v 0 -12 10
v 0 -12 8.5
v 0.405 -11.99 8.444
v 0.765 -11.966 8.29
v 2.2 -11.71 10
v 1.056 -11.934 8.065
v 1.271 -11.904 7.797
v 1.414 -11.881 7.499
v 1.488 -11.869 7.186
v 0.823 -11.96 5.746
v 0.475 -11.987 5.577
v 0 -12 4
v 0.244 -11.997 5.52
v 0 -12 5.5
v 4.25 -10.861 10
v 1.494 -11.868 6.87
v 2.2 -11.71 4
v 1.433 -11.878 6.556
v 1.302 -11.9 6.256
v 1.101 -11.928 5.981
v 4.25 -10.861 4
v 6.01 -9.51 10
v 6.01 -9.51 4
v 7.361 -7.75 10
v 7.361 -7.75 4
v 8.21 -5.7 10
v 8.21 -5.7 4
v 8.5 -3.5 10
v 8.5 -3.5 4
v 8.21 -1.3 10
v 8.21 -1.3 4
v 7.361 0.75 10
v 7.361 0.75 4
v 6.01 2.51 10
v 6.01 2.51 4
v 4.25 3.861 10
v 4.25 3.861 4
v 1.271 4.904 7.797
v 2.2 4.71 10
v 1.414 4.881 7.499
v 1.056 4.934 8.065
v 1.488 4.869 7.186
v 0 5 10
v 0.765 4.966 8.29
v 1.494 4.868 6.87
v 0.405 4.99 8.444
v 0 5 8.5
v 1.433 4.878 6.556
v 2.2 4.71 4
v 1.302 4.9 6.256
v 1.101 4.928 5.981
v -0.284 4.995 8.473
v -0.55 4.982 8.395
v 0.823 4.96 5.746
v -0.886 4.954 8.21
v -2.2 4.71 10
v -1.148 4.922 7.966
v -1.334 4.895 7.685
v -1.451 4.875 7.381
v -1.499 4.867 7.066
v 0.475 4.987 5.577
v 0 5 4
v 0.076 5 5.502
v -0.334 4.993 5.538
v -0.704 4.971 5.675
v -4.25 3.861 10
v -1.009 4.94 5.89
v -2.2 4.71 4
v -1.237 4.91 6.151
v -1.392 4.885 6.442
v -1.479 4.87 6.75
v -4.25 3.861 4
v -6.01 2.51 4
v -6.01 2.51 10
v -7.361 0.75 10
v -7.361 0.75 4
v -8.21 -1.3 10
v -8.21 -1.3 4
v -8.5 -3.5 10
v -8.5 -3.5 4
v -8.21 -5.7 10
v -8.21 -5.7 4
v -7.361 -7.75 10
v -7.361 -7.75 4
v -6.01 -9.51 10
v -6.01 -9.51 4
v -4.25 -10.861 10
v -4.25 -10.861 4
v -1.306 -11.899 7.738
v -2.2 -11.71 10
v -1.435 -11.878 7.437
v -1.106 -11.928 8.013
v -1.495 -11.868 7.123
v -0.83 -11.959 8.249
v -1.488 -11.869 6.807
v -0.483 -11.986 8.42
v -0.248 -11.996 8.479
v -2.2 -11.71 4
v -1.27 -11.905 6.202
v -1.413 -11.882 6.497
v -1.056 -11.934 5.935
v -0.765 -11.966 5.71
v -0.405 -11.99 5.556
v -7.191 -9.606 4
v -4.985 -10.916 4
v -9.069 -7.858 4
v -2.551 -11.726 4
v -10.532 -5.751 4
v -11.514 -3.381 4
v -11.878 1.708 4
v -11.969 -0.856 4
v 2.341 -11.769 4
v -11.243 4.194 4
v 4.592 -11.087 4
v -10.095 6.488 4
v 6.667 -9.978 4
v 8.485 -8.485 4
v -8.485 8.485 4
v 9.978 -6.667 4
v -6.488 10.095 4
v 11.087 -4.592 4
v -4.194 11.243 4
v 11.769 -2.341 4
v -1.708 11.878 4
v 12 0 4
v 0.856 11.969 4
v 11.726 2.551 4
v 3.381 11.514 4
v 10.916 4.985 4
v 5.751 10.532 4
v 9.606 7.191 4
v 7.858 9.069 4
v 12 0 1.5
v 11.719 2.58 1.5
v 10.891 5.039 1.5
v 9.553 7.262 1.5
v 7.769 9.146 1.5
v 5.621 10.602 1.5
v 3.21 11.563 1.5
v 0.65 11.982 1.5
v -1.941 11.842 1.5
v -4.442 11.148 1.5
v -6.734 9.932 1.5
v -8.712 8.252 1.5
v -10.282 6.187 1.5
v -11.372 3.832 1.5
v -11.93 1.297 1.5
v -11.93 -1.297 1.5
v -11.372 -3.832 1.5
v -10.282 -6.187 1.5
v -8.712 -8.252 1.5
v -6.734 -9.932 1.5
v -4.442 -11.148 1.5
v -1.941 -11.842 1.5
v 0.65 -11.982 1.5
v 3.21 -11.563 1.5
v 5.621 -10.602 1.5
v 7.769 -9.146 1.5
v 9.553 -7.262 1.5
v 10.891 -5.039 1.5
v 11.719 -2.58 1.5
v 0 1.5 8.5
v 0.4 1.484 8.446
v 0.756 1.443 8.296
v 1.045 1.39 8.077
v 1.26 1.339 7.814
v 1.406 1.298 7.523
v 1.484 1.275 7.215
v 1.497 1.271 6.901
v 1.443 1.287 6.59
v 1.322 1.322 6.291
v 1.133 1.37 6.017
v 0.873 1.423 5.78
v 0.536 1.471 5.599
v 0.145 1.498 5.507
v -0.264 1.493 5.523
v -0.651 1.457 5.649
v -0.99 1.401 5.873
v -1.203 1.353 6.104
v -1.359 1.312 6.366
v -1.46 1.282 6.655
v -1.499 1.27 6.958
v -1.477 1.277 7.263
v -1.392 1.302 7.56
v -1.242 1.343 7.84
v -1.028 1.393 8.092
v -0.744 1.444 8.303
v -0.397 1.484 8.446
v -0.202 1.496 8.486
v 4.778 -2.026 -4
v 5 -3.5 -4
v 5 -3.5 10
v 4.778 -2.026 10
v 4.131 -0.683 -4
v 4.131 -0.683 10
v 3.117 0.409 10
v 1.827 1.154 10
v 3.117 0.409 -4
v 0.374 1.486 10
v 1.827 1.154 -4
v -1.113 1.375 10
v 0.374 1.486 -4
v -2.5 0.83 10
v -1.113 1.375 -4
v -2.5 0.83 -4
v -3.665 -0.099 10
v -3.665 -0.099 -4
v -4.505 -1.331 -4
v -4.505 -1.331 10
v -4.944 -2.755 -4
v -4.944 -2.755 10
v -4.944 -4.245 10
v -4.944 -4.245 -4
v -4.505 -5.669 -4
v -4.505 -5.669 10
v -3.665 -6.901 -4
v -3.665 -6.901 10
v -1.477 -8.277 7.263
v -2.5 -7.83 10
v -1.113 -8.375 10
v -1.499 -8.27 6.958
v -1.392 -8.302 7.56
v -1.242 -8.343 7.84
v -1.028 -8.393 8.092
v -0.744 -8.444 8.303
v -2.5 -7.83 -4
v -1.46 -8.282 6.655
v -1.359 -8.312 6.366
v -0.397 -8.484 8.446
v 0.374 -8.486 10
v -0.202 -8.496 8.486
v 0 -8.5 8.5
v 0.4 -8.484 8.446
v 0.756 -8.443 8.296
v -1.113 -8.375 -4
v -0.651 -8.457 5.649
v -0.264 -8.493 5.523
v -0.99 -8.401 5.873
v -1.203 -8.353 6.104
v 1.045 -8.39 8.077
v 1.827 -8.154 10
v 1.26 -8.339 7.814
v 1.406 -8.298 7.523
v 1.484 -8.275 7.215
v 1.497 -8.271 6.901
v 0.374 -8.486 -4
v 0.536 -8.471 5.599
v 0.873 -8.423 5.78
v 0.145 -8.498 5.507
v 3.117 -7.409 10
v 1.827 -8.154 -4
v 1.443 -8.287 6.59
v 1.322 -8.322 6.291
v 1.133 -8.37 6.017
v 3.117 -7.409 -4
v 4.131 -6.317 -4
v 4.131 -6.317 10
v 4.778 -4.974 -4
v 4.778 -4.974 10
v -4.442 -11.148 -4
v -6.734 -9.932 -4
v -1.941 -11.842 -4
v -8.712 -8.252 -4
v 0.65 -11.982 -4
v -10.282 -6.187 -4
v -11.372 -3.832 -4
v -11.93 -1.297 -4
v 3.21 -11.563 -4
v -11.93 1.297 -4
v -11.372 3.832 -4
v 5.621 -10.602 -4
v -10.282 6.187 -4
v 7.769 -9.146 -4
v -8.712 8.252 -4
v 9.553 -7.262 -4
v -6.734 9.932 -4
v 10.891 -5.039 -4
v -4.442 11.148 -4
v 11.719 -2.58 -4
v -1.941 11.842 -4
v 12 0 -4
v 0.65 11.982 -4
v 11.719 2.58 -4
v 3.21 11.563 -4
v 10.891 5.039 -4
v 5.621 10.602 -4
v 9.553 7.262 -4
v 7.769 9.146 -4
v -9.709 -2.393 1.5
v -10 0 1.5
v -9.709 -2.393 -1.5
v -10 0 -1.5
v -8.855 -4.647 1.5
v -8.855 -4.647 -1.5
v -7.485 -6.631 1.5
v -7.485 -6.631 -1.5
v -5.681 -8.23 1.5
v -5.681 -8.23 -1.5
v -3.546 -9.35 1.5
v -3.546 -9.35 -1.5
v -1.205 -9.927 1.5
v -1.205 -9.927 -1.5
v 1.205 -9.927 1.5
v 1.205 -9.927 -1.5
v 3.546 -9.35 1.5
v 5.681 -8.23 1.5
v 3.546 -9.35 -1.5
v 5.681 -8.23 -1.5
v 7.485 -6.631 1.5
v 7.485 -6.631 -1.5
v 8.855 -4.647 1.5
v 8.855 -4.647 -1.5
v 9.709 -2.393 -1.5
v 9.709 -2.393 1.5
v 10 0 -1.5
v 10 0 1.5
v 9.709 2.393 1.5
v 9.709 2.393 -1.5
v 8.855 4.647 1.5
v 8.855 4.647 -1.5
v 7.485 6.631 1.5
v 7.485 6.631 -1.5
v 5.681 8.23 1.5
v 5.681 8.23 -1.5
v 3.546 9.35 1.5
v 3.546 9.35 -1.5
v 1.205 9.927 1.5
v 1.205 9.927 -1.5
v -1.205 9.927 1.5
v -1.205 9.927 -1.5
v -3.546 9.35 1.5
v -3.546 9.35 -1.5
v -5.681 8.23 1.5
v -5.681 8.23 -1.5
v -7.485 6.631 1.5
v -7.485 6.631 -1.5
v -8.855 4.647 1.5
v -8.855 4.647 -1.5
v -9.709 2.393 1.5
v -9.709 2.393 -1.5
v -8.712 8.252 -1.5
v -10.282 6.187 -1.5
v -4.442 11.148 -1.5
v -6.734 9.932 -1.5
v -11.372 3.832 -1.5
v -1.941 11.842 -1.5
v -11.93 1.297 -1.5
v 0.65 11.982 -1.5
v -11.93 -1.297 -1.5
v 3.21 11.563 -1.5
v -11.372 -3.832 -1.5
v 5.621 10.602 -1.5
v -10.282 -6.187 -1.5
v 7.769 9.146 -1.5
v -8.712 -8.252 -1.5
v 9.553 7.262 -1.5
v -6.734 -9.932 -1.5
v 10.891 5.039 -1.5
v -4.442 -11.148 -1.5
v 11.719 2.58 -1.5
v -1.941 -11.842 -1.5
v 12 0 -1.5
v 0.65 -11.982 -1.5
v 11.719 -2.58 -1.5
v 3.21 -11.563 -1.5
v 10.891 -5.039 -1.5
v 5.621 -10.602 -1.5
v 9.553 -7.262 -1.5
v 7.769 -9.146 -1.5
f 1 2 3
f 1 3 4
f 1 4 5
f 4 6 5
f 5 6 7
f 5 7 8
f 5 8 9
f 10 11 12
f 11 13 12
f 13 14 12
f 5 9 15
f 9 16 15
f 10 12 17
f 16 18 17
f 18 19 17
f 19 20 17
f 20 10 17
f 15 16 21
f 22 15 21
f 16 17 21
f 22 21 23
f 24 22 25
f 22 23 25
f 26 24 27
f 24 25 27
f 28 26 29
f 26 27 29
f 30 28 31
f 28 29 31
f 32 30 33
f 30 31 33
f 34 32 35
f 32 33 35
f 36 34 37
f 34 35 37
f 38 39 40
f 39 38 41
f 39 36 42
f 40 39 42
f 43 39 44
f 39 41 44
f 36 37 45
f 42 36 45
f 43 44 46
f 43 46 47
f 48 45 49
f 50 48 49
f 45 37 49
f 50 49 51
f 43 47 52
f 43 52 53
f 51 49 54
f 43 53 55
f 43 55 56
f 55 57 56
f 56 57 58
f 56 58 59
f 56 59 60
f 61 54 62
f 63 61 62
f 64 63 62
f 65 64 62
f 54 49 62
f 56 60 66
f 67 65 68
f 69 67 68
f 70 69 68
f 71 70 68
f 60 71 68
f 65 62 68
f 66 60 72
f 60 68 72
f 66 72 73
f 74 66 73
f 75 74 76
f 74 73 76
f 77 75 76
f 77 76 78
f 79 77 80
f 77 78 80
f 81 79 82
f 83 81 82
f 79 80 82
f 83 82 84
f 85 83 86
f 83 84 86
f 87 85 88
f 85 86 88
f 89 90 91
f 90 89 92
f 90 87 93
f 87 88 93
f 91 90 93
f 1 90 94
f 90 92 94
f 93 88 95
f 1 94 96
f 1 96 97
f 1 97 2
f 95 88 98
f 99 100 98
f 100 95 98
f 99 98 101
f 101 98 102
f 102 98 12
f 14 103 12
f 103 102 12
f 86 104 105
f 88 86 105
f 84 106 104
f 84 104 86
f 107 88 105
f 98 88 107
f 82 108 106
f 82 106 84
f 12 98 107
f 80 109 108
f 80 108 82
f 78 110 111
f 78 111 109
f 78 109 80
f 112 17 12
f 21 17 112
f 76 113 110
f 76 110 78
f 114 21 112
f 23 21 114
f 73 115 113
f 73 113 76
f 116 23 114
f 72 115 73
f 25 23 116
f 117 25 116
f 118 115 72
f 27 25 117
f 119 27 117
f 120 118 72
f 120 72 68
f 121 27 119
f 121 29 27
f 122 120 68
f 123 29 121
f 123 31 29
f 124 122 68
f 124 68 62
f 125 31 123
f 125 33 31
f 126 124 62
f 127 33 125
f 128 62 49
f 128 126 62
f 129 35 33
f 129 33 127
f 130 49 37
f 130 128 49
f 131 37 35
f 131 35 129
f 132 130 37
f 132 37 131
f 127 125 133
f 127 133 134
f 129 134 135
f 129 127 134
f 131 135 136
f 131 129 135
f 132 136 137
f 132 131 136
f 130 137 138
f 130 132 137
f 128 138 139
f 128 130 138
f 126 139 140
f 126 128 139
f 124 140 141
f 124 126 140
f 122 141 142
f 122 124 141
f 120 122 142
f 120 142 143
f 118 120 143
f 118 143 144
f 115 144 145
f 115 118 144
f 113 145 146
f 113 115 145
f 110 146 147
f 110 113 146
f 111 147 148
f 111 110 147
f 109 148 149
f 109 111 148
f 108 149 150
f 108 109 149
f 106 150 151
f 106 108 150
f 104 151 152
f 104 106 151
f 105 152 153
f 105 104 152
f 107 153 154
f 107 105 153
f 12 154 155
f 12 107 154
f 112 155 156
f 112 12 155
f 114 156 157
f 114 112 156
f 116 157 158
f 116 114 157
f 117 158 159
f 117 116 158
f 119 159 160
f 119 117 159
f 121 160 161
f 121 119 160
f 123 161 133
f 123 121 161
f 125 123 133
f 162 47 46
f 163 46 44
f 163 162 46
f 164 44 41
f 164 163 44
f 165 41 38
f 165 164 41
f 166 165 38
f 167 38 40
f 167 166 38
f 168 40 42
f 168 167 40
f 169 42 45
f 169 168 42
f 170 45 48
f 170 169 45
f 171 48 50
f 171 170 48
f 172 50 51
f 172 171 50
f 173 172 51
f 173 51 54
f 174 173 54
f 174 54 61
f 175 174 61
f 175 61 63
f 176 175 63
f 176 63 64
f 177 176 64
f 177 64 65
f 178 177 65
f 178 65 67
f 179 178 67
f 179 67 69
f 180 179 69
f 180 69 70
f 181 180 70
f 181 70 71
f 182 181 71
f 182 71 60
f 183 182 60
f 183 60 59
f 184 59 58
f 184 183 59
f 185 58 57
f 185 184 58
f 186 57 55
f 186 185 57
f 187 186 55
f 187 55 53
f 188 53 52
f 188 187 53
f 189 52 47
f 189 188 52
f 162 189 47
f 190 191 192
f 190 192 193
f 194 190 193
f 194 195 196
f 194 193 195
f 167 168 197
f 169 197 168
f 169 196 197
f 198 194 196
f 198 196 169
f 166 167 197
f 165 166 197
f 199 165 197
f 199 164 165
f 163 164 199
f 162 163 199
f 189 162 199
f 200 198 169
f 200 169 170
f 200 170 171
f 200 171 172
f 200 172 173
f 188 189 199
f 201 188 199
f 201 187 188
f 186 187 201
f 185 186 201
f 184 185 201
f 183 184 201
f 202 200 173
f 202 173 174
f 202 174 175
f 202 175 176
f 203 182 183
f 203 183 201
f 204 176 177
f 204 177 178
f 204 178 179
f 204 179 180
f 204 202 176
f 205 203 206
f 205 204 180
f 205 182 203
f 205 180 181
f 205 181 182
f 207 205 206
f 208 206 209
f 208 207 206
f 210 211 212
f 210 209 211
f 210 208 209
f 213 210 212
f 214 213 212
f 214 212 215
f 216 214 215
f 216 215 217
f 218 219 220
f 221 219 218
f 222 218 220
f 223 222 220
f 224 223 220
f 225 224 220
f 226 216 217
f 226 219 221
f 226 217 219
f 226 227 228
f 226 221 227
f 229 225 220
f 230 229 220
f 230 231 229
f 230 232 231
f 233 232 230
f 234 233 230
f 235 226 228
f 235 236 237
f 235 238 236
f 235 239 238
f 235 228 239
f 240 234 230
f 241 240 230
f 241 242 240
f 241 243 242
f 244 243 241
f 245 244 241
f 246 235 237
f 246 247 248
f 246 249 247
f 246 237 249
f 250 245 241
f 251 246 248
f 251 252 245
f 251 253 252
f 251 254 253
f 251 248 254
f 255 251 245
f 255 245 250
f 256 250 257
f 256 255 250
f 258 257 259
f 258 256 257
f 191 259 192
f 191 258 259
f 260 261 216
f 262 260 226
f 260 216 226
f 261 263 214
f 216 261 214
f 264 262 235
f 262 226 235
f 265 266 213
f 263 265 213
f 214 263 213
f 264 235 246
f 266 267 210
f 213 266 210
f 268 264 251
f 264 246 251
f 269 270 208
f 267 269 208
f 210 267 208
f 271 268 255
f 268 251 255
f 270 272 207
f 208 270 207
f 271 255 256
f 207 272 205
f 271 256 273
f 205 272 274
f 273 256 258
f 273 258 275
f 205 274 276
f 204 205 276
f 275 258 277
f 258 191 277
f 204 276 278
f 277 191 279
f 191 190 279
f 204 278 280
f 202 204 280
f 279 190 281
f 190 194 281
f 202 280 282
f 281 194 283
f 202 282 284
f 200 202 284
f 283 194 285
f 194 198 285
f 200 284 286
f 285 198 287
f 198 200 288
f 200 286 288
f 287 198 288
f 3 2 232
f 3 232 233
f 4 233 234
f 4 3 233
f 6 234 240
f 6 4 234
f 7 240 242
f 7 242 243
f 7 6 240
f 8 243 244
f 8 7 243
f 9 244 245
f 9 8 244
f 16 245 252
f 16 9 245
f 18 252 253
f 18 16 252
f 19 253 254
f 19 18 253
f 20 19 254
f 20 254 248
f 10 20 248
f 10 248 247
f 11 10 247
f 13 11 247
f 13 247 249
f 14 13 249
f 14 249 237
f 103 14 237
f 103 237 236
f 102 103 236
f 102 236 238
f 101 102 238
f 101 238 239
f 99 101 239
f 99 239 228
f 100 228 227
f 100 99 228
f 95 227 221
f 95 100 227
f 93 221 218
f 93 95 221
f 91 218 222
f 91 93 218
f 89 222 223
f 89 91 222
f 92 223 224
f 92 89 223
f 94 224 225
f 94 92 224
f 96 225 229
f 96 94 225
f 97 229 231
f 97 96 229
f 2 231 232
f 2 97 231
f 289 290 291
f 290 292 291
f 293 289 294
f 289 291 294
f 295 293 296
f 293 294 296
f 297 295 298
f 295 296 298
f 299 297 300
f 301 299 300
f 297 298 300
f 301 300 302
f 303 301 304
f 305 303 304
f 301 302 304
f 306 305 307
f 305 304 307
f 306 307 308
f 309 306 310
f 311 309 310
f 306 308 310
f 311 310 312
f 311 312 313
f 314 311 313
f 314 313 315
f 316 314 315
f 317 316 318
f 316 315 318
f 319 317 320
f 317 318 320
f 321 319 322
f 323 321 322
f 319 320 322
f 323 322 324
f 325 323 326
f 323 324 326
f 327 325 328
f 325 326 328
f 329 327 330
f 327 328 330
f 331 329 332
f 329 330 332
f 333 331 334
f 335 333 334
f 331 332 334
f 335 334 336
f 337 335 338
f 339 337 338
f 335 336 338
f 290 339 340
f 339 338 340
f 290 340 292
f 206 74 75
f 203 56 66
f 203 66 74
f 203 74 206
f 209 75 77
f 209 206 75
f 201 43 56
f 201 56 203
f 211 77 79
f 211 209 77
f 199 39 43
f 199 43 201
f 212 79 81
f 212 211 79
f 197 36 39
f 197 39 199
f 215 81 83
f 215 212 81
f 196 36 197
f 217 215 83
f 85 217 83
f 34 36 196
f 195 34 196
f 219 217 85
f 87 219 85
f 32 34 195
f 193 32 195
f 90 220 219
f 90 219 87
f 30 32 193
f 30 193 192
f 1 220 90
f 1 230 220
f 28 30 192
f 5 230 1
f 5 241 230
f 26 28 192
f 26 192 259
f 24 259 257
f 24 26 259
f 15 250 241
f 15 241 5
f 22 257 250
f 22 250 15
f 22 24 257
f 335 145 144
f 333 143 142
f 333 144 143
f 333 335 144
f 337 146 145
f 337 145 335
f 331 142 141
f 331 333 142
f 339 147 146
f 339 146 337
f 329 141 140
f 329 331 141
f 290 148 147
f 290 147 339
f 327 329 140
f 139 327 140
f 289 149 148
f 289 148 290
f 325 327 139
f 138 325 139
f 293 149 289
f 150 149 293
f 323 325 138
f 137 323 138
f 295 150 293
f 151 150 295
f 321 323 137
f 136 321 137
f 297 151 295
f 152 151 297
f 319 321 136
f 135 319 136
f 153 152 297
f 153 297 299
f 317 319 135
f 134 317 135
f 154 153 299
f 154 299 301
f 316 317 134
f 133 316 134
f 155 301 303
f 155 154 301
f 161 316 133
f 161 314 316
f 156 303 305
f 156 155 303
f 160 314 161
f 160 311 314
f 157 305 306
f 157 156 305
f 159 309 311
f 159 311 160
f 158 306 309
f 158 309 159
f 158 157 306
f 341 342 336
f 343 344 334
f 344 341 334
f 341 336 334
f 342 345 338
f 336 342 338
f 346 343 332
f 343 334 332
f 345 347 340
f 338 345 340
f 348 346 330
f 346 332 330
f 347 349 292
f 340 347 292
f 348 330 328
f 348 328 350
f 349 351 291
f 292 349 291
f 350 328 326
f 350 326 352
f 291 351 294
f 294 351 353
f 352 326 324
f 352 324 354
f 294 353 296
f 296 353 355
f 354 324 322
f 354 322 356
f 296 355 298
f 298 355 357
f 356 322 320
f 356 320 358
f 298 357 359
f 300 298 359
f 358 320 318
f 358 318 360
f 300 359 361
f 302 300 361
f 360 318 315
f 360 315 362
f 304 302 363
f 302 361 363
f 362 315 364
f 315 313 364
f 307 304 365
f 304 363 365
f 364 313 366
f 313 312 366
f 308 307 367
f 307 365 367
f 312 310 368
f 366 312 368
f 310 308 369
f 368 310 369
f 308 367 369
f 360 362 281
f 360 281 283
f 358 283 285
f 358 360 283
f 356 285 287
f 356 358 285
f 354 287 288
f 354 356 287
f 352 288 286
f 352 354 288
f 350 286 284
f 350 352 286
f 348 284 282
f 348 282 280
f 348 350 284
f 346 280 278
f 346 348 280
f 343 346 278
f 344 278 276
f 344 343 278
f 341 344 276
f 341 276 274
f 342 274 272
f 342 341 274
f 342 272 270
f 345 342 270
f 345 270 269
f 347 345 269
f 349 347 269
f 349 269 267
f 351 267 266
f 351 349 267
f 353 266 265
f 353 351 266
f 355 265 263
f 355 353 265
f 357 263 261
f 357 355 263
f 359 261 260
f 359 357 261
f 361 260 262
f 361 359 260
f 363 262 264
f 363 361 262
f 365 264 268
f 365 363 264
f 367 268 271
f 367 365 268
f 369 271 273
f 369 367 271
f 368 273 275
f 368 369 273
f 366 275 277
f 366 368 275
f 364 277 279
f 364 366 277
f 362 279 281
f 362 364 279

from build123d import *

# Parameters (mm, degrees)
SKETCH1_R               = 12
BOSS_EXTRUDE1_DEPTH     = 4
SKETCH3_W               = 3
SKETCH3_H               = 3.312885388
SKETCH6_R               = 8.5
BOSS_EXTRUDE2_DEPTH     = 6
CUT_EXTRUDE1_DEPTH      = 23
CUT_EXTRUDE1_DEPTH_BACK = 23
SKETCH7_R               = 5
CUT_EXTRUDE2_DEPTH      = 20.697715604
CUT_EXTRUDE2_DEPTH_BACK = 20.697715604
SKETCH8_R               = 1.5


with BuildPart() as part:
    # Sketch1 → Boss-Extrude1 (new, symmetric)
    with BuildSketch(Plane.XY):
        Circle(SKETCH1_R)
    extrude(amount=BOSS_EXTRUDE1_DEPTH, both=True)

    # Sketch3 → Cut-Revolve2 (revolve, cut)
    with BuildSketch(Plane(origin=(0, 0, 0), x_dir=(0, 0, -1), z_dir=(1, 0, 0)), mode=Mode.PRIVATE) as cut_revolve2_sk:
        with Locations((0, 11.656442694)):
            Rectangle(SKETCH3_W, SKETCH3_H)
    revolve(cut_revolve2_sk.sketch.rotate(Axis((0, 0, 0), (0, 0, 1)), 90), axis=Axis((0, 0, 0), (0, 0, 1)), mode=Mode.SUBTRACT)

    # Sketch6 → Boss-Extrude2 (add)
    with BuildSketch(Plane.XY.offset(4)):
        with Locations(Location((0, -3.5, 0), (0, 0, 270))):
            Circle(SKETCH6_R)
    extrude(amount=BOSS_EXTRUDE2_DEPTH)

    # Sketch7 → Cut-Extrude1 (cut, two sides: drawn at the far end of the back side and taken through both)
    with BuildSketch(Plane.XY.offset(10).offset(-CUT_EXTRUDE1_DEPTH_BACK)):
        with Locations((0, -3.5)):
            Circle(SKETCH7_R)
    extrude(amount=CUT_EXTRUDE1_DEPTH + CUT_EXTRUDE1_DEPTH_BACK, mode=Mode.SUBTRACT)

    # Sketch8 → Cut-Extrude2 (cut, two sides: drawn at the far end of the back side and taken through both)
    with BuildSketch(Plane(origin=(0, 0, 0), x_dir=(1, 0, 0), z_dir=(0, 1, 0)).offset(-CUT_EXTRUDE2_DEPTH_BACK)):
        with Locations(Location((0, -7, 0), (0, 0, 270))):
            Circle(SKETCH8_R)
    extrude(amount=CUT_EXTRUDE2_DEPTH + CUT_EXTRUDE2_DEPTH_BACK, mode=Mode.SUBTRACT)


solid = part.part
